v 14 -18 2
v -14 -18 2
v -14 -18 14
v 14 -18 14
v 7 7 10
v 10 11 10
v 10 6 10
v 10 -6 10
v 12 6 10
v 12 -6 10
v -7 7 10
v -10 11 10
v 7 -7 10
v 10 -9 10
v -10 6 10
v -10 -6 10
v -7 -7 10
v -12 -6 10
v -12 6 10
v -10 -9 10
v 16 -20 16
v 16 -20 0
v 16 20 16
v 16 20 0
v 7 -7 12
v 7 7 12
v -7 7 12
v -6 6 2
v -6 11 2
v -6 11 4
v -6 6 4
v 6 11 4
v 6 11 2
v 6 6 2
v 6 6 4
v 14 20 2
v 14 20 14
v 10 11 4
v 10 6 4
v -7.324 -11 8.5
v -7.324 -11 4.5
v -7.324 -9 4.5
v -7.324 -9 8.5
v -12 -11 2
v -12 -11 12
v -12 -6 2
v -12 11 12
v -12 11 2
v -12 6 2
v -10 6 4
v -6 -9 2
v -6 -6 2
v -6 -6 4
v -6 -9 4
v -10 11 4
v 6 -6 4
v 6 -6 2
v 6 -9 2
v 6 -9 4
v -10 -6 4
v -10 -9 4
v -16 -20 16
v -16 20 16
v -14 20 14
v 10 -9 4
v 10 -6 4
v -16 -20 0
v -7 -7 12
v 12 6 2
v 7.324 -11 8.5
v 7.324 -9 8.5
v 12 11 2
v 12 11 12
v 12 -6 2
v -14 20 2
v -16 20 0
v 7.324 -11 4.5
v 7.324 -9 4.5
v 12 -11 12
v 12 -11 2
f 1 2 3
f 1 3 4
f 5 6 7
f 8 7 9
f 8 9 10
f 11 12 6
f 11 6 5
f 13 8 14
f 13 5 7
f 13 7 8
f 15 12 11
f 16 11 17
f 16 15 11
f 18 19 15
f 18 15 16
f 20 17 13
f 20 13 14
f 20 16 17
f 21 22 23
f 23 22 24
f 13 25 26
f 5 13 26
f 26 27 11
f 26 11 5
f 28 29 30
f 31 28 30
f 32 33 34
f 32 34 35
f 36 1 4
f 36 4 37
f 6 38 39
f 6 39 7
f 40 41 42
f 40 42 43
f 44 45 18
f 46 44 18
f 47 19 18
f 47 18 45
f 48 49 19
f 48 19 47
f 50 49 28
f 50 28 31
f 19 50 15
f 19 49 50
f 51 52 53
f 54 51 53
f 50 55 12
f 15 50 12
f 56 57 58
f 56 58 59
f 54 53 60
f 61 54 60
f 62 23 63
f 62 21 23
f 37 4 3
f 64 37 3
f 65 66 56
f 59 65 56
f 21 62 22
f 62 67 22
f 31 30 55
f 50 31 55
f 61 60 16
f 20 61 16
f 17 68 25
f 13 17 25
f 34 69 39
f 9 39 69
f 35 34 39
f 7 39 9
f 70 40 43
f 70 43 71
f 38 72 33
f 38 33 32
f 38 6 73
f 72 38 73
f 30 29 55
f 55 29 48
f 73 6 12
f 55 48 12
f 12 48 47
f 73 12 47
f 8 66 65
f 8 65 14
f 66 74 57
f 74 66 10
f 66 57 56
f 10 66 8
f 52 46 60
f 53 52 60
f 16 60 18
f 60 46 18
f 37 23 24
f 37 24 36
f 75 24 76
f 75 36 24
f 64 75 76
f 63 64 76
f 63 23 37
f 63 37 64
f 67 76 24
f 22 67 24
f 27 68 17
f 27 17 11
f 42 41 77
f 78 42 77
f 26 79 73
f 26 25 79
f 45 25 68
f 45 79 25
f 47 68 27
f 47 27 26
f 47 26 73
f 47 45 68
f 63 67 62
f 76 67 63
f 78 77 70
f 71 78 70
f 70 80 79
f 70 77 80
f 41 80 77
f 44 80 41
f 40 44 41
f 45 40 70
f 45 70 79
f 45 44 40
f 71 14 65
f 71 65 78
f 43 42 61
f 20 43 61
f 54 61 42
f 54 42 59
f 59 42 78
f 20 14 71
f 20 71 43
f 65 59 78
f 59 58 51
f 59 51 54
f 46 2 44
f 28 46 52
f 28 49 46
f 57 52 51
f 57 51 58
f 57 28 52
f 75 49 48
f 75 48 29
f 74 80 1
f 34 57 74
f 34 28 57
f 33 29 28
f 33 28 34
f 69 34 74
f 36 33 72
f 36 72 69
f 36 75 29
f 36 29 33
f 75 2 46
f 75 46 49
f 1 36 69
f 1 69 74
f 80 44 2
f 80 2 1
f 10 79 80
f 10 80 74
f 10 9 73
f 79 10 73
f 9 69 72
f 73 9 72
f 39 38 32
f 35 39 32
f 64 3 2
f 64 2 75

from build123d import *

# Parameters (mm, degrees)
F0_W      = 32
F0_H      = 40
F1_DEPTH  = 2
F3_W      = 22
F3_H      = 22
F4_DEPTH  = 10
F6_DEPTH  = 1
F7_DEPTH  = 1
F5_W      = 20
F5_H      = 6
F8_DEPTH  = 20
F9_W      = 12
F9_H      = 2
F10_DEPTH = 20
F11_W     = 12
F11_H     = 8
F12_DEPTH = 25
F13_W     = 14.6482707933
F13_H     = 4
F14_DEPTH = 25
F15_W     = 14
F15_H     = 14
F16_DEPTH = 5
F2_W      = 32
F2_H      = 40
F2_W_2    = 28
F2_H_2    = 36
F17_DEPTH = 14
F19_W     = 28
F19_H     = 2
F20_DEPTH = 14
F18_W     = 28
F18_H     = 2
F21_DEPTH = 38


with BuildPart() as f1:
    # F0 (on Top) → F1 (new body)
    with BuildSketch(Plane.XY):
        Rectangle(F0_W, F0_H)
    extrude(amount=F1_DEPTH)

    # F3 (on face) → F4 (join)
    with BuildSketch(Plane.XY.offset(2)):
        Rectangle(F3_W, F3_H)
    extrude(amount=F4_DEPTH)

    # F6 (add): a face of the model
    f6_faces = [f1.faces().sort_by_distance(p)[0] for p in [
        (-11, 0, 7),
    ]]
    extrude(f6_faces, amount=F6_DEPTH)

    # F7 (add): a face of the model
    f7_faces = [f1.faces().sort_by_distance(p)[0] for p in [
        (11, 0, 7),
    ]]
    extrude(f7_faces, amount=F7_DEPTH)

    # F5 (on face) → F8 (cut)
    with BuildSketch(Plane(origin=(0, 11, 0), x_dir=(-1, 0, 0), z_dir=(0, 1, 0))):
        with Locations((0, 7)):
            Rectangle(F5_W, F5_H)
    extrude(amount=-F8_DEPTH, mode=Mode.SUBTRACT)

    # F9 (on face) → F10 (cut)
    with BuildSketch(Plane(origin=(0, 11, 0), x_dir=(-1, 0, 0), z_dir=(0, 1, 0))):
        with Locations((0, 3)):
            Rectangle(F9_W, F9_H)
    extrude(amount=-F10_DEPTH, mode=Mode.SUBTRACT)

    # F11 (on face) → F12 (cut)
    with BuildSketch(Plane(origin=(-12, 0, 0), x_dir=(0, -1, 0), z_dir=(-1, 0, 0))):
        with Locations((0, 6)):
            Rectangle(F11_W, F11_H)
    extrude(amount=-F12_DEPTH, mode=Mode.SUBTRACT)

    # F13 (on face) → F14 (cut)
    with BuildSketch(Plane.XZ.offset(11)):
        with Locations((0, 6.5)):
            Rectangle(F13_W, F13_H)
    extrude(amount=-F14_DEPTH, mode=Mode.SUBTRACT)

    # F15 (on face) → F16 (cut)
    with BuildSketch(Plane.XY.offset(12)):
        Rectangle(F15_W, F15_H)
    extrude(amount=-F16_DEPTH, mode=Mode.SUBTRACT)

    # F2 (on face) → F17 (join)
    with BuildSketch(Plane.XY.offset(2)):
        Rectangle(F2_W, F2_H)
        Rectangle(F2_W_2, F2_H_2, mode=Mode.SUBTRACT)
    extrude(amount=F17_DEPTH)

    # F19 (on face) → F20 (cut)
    with BuildSketch(Plane.XY.offset(16)):
        with Locations((0, 19)):
            Rectangle(F19_W, F19_H)
    extrude(amount=-F20_DEPTH, mode=Mode.SUBTRACT)

    # F18 (on face) → F21 (join)
    with BuildSketch(Plane(origin=(0, -18, 0), x_dir=(-1, 0, 0), z_dir=(0, 1, 0))):
        with Locations((0, 15)):
            Rectangle(F18_W, F18_H)
    extrude(amount=F21_DEPTH)


solid = f1.part
